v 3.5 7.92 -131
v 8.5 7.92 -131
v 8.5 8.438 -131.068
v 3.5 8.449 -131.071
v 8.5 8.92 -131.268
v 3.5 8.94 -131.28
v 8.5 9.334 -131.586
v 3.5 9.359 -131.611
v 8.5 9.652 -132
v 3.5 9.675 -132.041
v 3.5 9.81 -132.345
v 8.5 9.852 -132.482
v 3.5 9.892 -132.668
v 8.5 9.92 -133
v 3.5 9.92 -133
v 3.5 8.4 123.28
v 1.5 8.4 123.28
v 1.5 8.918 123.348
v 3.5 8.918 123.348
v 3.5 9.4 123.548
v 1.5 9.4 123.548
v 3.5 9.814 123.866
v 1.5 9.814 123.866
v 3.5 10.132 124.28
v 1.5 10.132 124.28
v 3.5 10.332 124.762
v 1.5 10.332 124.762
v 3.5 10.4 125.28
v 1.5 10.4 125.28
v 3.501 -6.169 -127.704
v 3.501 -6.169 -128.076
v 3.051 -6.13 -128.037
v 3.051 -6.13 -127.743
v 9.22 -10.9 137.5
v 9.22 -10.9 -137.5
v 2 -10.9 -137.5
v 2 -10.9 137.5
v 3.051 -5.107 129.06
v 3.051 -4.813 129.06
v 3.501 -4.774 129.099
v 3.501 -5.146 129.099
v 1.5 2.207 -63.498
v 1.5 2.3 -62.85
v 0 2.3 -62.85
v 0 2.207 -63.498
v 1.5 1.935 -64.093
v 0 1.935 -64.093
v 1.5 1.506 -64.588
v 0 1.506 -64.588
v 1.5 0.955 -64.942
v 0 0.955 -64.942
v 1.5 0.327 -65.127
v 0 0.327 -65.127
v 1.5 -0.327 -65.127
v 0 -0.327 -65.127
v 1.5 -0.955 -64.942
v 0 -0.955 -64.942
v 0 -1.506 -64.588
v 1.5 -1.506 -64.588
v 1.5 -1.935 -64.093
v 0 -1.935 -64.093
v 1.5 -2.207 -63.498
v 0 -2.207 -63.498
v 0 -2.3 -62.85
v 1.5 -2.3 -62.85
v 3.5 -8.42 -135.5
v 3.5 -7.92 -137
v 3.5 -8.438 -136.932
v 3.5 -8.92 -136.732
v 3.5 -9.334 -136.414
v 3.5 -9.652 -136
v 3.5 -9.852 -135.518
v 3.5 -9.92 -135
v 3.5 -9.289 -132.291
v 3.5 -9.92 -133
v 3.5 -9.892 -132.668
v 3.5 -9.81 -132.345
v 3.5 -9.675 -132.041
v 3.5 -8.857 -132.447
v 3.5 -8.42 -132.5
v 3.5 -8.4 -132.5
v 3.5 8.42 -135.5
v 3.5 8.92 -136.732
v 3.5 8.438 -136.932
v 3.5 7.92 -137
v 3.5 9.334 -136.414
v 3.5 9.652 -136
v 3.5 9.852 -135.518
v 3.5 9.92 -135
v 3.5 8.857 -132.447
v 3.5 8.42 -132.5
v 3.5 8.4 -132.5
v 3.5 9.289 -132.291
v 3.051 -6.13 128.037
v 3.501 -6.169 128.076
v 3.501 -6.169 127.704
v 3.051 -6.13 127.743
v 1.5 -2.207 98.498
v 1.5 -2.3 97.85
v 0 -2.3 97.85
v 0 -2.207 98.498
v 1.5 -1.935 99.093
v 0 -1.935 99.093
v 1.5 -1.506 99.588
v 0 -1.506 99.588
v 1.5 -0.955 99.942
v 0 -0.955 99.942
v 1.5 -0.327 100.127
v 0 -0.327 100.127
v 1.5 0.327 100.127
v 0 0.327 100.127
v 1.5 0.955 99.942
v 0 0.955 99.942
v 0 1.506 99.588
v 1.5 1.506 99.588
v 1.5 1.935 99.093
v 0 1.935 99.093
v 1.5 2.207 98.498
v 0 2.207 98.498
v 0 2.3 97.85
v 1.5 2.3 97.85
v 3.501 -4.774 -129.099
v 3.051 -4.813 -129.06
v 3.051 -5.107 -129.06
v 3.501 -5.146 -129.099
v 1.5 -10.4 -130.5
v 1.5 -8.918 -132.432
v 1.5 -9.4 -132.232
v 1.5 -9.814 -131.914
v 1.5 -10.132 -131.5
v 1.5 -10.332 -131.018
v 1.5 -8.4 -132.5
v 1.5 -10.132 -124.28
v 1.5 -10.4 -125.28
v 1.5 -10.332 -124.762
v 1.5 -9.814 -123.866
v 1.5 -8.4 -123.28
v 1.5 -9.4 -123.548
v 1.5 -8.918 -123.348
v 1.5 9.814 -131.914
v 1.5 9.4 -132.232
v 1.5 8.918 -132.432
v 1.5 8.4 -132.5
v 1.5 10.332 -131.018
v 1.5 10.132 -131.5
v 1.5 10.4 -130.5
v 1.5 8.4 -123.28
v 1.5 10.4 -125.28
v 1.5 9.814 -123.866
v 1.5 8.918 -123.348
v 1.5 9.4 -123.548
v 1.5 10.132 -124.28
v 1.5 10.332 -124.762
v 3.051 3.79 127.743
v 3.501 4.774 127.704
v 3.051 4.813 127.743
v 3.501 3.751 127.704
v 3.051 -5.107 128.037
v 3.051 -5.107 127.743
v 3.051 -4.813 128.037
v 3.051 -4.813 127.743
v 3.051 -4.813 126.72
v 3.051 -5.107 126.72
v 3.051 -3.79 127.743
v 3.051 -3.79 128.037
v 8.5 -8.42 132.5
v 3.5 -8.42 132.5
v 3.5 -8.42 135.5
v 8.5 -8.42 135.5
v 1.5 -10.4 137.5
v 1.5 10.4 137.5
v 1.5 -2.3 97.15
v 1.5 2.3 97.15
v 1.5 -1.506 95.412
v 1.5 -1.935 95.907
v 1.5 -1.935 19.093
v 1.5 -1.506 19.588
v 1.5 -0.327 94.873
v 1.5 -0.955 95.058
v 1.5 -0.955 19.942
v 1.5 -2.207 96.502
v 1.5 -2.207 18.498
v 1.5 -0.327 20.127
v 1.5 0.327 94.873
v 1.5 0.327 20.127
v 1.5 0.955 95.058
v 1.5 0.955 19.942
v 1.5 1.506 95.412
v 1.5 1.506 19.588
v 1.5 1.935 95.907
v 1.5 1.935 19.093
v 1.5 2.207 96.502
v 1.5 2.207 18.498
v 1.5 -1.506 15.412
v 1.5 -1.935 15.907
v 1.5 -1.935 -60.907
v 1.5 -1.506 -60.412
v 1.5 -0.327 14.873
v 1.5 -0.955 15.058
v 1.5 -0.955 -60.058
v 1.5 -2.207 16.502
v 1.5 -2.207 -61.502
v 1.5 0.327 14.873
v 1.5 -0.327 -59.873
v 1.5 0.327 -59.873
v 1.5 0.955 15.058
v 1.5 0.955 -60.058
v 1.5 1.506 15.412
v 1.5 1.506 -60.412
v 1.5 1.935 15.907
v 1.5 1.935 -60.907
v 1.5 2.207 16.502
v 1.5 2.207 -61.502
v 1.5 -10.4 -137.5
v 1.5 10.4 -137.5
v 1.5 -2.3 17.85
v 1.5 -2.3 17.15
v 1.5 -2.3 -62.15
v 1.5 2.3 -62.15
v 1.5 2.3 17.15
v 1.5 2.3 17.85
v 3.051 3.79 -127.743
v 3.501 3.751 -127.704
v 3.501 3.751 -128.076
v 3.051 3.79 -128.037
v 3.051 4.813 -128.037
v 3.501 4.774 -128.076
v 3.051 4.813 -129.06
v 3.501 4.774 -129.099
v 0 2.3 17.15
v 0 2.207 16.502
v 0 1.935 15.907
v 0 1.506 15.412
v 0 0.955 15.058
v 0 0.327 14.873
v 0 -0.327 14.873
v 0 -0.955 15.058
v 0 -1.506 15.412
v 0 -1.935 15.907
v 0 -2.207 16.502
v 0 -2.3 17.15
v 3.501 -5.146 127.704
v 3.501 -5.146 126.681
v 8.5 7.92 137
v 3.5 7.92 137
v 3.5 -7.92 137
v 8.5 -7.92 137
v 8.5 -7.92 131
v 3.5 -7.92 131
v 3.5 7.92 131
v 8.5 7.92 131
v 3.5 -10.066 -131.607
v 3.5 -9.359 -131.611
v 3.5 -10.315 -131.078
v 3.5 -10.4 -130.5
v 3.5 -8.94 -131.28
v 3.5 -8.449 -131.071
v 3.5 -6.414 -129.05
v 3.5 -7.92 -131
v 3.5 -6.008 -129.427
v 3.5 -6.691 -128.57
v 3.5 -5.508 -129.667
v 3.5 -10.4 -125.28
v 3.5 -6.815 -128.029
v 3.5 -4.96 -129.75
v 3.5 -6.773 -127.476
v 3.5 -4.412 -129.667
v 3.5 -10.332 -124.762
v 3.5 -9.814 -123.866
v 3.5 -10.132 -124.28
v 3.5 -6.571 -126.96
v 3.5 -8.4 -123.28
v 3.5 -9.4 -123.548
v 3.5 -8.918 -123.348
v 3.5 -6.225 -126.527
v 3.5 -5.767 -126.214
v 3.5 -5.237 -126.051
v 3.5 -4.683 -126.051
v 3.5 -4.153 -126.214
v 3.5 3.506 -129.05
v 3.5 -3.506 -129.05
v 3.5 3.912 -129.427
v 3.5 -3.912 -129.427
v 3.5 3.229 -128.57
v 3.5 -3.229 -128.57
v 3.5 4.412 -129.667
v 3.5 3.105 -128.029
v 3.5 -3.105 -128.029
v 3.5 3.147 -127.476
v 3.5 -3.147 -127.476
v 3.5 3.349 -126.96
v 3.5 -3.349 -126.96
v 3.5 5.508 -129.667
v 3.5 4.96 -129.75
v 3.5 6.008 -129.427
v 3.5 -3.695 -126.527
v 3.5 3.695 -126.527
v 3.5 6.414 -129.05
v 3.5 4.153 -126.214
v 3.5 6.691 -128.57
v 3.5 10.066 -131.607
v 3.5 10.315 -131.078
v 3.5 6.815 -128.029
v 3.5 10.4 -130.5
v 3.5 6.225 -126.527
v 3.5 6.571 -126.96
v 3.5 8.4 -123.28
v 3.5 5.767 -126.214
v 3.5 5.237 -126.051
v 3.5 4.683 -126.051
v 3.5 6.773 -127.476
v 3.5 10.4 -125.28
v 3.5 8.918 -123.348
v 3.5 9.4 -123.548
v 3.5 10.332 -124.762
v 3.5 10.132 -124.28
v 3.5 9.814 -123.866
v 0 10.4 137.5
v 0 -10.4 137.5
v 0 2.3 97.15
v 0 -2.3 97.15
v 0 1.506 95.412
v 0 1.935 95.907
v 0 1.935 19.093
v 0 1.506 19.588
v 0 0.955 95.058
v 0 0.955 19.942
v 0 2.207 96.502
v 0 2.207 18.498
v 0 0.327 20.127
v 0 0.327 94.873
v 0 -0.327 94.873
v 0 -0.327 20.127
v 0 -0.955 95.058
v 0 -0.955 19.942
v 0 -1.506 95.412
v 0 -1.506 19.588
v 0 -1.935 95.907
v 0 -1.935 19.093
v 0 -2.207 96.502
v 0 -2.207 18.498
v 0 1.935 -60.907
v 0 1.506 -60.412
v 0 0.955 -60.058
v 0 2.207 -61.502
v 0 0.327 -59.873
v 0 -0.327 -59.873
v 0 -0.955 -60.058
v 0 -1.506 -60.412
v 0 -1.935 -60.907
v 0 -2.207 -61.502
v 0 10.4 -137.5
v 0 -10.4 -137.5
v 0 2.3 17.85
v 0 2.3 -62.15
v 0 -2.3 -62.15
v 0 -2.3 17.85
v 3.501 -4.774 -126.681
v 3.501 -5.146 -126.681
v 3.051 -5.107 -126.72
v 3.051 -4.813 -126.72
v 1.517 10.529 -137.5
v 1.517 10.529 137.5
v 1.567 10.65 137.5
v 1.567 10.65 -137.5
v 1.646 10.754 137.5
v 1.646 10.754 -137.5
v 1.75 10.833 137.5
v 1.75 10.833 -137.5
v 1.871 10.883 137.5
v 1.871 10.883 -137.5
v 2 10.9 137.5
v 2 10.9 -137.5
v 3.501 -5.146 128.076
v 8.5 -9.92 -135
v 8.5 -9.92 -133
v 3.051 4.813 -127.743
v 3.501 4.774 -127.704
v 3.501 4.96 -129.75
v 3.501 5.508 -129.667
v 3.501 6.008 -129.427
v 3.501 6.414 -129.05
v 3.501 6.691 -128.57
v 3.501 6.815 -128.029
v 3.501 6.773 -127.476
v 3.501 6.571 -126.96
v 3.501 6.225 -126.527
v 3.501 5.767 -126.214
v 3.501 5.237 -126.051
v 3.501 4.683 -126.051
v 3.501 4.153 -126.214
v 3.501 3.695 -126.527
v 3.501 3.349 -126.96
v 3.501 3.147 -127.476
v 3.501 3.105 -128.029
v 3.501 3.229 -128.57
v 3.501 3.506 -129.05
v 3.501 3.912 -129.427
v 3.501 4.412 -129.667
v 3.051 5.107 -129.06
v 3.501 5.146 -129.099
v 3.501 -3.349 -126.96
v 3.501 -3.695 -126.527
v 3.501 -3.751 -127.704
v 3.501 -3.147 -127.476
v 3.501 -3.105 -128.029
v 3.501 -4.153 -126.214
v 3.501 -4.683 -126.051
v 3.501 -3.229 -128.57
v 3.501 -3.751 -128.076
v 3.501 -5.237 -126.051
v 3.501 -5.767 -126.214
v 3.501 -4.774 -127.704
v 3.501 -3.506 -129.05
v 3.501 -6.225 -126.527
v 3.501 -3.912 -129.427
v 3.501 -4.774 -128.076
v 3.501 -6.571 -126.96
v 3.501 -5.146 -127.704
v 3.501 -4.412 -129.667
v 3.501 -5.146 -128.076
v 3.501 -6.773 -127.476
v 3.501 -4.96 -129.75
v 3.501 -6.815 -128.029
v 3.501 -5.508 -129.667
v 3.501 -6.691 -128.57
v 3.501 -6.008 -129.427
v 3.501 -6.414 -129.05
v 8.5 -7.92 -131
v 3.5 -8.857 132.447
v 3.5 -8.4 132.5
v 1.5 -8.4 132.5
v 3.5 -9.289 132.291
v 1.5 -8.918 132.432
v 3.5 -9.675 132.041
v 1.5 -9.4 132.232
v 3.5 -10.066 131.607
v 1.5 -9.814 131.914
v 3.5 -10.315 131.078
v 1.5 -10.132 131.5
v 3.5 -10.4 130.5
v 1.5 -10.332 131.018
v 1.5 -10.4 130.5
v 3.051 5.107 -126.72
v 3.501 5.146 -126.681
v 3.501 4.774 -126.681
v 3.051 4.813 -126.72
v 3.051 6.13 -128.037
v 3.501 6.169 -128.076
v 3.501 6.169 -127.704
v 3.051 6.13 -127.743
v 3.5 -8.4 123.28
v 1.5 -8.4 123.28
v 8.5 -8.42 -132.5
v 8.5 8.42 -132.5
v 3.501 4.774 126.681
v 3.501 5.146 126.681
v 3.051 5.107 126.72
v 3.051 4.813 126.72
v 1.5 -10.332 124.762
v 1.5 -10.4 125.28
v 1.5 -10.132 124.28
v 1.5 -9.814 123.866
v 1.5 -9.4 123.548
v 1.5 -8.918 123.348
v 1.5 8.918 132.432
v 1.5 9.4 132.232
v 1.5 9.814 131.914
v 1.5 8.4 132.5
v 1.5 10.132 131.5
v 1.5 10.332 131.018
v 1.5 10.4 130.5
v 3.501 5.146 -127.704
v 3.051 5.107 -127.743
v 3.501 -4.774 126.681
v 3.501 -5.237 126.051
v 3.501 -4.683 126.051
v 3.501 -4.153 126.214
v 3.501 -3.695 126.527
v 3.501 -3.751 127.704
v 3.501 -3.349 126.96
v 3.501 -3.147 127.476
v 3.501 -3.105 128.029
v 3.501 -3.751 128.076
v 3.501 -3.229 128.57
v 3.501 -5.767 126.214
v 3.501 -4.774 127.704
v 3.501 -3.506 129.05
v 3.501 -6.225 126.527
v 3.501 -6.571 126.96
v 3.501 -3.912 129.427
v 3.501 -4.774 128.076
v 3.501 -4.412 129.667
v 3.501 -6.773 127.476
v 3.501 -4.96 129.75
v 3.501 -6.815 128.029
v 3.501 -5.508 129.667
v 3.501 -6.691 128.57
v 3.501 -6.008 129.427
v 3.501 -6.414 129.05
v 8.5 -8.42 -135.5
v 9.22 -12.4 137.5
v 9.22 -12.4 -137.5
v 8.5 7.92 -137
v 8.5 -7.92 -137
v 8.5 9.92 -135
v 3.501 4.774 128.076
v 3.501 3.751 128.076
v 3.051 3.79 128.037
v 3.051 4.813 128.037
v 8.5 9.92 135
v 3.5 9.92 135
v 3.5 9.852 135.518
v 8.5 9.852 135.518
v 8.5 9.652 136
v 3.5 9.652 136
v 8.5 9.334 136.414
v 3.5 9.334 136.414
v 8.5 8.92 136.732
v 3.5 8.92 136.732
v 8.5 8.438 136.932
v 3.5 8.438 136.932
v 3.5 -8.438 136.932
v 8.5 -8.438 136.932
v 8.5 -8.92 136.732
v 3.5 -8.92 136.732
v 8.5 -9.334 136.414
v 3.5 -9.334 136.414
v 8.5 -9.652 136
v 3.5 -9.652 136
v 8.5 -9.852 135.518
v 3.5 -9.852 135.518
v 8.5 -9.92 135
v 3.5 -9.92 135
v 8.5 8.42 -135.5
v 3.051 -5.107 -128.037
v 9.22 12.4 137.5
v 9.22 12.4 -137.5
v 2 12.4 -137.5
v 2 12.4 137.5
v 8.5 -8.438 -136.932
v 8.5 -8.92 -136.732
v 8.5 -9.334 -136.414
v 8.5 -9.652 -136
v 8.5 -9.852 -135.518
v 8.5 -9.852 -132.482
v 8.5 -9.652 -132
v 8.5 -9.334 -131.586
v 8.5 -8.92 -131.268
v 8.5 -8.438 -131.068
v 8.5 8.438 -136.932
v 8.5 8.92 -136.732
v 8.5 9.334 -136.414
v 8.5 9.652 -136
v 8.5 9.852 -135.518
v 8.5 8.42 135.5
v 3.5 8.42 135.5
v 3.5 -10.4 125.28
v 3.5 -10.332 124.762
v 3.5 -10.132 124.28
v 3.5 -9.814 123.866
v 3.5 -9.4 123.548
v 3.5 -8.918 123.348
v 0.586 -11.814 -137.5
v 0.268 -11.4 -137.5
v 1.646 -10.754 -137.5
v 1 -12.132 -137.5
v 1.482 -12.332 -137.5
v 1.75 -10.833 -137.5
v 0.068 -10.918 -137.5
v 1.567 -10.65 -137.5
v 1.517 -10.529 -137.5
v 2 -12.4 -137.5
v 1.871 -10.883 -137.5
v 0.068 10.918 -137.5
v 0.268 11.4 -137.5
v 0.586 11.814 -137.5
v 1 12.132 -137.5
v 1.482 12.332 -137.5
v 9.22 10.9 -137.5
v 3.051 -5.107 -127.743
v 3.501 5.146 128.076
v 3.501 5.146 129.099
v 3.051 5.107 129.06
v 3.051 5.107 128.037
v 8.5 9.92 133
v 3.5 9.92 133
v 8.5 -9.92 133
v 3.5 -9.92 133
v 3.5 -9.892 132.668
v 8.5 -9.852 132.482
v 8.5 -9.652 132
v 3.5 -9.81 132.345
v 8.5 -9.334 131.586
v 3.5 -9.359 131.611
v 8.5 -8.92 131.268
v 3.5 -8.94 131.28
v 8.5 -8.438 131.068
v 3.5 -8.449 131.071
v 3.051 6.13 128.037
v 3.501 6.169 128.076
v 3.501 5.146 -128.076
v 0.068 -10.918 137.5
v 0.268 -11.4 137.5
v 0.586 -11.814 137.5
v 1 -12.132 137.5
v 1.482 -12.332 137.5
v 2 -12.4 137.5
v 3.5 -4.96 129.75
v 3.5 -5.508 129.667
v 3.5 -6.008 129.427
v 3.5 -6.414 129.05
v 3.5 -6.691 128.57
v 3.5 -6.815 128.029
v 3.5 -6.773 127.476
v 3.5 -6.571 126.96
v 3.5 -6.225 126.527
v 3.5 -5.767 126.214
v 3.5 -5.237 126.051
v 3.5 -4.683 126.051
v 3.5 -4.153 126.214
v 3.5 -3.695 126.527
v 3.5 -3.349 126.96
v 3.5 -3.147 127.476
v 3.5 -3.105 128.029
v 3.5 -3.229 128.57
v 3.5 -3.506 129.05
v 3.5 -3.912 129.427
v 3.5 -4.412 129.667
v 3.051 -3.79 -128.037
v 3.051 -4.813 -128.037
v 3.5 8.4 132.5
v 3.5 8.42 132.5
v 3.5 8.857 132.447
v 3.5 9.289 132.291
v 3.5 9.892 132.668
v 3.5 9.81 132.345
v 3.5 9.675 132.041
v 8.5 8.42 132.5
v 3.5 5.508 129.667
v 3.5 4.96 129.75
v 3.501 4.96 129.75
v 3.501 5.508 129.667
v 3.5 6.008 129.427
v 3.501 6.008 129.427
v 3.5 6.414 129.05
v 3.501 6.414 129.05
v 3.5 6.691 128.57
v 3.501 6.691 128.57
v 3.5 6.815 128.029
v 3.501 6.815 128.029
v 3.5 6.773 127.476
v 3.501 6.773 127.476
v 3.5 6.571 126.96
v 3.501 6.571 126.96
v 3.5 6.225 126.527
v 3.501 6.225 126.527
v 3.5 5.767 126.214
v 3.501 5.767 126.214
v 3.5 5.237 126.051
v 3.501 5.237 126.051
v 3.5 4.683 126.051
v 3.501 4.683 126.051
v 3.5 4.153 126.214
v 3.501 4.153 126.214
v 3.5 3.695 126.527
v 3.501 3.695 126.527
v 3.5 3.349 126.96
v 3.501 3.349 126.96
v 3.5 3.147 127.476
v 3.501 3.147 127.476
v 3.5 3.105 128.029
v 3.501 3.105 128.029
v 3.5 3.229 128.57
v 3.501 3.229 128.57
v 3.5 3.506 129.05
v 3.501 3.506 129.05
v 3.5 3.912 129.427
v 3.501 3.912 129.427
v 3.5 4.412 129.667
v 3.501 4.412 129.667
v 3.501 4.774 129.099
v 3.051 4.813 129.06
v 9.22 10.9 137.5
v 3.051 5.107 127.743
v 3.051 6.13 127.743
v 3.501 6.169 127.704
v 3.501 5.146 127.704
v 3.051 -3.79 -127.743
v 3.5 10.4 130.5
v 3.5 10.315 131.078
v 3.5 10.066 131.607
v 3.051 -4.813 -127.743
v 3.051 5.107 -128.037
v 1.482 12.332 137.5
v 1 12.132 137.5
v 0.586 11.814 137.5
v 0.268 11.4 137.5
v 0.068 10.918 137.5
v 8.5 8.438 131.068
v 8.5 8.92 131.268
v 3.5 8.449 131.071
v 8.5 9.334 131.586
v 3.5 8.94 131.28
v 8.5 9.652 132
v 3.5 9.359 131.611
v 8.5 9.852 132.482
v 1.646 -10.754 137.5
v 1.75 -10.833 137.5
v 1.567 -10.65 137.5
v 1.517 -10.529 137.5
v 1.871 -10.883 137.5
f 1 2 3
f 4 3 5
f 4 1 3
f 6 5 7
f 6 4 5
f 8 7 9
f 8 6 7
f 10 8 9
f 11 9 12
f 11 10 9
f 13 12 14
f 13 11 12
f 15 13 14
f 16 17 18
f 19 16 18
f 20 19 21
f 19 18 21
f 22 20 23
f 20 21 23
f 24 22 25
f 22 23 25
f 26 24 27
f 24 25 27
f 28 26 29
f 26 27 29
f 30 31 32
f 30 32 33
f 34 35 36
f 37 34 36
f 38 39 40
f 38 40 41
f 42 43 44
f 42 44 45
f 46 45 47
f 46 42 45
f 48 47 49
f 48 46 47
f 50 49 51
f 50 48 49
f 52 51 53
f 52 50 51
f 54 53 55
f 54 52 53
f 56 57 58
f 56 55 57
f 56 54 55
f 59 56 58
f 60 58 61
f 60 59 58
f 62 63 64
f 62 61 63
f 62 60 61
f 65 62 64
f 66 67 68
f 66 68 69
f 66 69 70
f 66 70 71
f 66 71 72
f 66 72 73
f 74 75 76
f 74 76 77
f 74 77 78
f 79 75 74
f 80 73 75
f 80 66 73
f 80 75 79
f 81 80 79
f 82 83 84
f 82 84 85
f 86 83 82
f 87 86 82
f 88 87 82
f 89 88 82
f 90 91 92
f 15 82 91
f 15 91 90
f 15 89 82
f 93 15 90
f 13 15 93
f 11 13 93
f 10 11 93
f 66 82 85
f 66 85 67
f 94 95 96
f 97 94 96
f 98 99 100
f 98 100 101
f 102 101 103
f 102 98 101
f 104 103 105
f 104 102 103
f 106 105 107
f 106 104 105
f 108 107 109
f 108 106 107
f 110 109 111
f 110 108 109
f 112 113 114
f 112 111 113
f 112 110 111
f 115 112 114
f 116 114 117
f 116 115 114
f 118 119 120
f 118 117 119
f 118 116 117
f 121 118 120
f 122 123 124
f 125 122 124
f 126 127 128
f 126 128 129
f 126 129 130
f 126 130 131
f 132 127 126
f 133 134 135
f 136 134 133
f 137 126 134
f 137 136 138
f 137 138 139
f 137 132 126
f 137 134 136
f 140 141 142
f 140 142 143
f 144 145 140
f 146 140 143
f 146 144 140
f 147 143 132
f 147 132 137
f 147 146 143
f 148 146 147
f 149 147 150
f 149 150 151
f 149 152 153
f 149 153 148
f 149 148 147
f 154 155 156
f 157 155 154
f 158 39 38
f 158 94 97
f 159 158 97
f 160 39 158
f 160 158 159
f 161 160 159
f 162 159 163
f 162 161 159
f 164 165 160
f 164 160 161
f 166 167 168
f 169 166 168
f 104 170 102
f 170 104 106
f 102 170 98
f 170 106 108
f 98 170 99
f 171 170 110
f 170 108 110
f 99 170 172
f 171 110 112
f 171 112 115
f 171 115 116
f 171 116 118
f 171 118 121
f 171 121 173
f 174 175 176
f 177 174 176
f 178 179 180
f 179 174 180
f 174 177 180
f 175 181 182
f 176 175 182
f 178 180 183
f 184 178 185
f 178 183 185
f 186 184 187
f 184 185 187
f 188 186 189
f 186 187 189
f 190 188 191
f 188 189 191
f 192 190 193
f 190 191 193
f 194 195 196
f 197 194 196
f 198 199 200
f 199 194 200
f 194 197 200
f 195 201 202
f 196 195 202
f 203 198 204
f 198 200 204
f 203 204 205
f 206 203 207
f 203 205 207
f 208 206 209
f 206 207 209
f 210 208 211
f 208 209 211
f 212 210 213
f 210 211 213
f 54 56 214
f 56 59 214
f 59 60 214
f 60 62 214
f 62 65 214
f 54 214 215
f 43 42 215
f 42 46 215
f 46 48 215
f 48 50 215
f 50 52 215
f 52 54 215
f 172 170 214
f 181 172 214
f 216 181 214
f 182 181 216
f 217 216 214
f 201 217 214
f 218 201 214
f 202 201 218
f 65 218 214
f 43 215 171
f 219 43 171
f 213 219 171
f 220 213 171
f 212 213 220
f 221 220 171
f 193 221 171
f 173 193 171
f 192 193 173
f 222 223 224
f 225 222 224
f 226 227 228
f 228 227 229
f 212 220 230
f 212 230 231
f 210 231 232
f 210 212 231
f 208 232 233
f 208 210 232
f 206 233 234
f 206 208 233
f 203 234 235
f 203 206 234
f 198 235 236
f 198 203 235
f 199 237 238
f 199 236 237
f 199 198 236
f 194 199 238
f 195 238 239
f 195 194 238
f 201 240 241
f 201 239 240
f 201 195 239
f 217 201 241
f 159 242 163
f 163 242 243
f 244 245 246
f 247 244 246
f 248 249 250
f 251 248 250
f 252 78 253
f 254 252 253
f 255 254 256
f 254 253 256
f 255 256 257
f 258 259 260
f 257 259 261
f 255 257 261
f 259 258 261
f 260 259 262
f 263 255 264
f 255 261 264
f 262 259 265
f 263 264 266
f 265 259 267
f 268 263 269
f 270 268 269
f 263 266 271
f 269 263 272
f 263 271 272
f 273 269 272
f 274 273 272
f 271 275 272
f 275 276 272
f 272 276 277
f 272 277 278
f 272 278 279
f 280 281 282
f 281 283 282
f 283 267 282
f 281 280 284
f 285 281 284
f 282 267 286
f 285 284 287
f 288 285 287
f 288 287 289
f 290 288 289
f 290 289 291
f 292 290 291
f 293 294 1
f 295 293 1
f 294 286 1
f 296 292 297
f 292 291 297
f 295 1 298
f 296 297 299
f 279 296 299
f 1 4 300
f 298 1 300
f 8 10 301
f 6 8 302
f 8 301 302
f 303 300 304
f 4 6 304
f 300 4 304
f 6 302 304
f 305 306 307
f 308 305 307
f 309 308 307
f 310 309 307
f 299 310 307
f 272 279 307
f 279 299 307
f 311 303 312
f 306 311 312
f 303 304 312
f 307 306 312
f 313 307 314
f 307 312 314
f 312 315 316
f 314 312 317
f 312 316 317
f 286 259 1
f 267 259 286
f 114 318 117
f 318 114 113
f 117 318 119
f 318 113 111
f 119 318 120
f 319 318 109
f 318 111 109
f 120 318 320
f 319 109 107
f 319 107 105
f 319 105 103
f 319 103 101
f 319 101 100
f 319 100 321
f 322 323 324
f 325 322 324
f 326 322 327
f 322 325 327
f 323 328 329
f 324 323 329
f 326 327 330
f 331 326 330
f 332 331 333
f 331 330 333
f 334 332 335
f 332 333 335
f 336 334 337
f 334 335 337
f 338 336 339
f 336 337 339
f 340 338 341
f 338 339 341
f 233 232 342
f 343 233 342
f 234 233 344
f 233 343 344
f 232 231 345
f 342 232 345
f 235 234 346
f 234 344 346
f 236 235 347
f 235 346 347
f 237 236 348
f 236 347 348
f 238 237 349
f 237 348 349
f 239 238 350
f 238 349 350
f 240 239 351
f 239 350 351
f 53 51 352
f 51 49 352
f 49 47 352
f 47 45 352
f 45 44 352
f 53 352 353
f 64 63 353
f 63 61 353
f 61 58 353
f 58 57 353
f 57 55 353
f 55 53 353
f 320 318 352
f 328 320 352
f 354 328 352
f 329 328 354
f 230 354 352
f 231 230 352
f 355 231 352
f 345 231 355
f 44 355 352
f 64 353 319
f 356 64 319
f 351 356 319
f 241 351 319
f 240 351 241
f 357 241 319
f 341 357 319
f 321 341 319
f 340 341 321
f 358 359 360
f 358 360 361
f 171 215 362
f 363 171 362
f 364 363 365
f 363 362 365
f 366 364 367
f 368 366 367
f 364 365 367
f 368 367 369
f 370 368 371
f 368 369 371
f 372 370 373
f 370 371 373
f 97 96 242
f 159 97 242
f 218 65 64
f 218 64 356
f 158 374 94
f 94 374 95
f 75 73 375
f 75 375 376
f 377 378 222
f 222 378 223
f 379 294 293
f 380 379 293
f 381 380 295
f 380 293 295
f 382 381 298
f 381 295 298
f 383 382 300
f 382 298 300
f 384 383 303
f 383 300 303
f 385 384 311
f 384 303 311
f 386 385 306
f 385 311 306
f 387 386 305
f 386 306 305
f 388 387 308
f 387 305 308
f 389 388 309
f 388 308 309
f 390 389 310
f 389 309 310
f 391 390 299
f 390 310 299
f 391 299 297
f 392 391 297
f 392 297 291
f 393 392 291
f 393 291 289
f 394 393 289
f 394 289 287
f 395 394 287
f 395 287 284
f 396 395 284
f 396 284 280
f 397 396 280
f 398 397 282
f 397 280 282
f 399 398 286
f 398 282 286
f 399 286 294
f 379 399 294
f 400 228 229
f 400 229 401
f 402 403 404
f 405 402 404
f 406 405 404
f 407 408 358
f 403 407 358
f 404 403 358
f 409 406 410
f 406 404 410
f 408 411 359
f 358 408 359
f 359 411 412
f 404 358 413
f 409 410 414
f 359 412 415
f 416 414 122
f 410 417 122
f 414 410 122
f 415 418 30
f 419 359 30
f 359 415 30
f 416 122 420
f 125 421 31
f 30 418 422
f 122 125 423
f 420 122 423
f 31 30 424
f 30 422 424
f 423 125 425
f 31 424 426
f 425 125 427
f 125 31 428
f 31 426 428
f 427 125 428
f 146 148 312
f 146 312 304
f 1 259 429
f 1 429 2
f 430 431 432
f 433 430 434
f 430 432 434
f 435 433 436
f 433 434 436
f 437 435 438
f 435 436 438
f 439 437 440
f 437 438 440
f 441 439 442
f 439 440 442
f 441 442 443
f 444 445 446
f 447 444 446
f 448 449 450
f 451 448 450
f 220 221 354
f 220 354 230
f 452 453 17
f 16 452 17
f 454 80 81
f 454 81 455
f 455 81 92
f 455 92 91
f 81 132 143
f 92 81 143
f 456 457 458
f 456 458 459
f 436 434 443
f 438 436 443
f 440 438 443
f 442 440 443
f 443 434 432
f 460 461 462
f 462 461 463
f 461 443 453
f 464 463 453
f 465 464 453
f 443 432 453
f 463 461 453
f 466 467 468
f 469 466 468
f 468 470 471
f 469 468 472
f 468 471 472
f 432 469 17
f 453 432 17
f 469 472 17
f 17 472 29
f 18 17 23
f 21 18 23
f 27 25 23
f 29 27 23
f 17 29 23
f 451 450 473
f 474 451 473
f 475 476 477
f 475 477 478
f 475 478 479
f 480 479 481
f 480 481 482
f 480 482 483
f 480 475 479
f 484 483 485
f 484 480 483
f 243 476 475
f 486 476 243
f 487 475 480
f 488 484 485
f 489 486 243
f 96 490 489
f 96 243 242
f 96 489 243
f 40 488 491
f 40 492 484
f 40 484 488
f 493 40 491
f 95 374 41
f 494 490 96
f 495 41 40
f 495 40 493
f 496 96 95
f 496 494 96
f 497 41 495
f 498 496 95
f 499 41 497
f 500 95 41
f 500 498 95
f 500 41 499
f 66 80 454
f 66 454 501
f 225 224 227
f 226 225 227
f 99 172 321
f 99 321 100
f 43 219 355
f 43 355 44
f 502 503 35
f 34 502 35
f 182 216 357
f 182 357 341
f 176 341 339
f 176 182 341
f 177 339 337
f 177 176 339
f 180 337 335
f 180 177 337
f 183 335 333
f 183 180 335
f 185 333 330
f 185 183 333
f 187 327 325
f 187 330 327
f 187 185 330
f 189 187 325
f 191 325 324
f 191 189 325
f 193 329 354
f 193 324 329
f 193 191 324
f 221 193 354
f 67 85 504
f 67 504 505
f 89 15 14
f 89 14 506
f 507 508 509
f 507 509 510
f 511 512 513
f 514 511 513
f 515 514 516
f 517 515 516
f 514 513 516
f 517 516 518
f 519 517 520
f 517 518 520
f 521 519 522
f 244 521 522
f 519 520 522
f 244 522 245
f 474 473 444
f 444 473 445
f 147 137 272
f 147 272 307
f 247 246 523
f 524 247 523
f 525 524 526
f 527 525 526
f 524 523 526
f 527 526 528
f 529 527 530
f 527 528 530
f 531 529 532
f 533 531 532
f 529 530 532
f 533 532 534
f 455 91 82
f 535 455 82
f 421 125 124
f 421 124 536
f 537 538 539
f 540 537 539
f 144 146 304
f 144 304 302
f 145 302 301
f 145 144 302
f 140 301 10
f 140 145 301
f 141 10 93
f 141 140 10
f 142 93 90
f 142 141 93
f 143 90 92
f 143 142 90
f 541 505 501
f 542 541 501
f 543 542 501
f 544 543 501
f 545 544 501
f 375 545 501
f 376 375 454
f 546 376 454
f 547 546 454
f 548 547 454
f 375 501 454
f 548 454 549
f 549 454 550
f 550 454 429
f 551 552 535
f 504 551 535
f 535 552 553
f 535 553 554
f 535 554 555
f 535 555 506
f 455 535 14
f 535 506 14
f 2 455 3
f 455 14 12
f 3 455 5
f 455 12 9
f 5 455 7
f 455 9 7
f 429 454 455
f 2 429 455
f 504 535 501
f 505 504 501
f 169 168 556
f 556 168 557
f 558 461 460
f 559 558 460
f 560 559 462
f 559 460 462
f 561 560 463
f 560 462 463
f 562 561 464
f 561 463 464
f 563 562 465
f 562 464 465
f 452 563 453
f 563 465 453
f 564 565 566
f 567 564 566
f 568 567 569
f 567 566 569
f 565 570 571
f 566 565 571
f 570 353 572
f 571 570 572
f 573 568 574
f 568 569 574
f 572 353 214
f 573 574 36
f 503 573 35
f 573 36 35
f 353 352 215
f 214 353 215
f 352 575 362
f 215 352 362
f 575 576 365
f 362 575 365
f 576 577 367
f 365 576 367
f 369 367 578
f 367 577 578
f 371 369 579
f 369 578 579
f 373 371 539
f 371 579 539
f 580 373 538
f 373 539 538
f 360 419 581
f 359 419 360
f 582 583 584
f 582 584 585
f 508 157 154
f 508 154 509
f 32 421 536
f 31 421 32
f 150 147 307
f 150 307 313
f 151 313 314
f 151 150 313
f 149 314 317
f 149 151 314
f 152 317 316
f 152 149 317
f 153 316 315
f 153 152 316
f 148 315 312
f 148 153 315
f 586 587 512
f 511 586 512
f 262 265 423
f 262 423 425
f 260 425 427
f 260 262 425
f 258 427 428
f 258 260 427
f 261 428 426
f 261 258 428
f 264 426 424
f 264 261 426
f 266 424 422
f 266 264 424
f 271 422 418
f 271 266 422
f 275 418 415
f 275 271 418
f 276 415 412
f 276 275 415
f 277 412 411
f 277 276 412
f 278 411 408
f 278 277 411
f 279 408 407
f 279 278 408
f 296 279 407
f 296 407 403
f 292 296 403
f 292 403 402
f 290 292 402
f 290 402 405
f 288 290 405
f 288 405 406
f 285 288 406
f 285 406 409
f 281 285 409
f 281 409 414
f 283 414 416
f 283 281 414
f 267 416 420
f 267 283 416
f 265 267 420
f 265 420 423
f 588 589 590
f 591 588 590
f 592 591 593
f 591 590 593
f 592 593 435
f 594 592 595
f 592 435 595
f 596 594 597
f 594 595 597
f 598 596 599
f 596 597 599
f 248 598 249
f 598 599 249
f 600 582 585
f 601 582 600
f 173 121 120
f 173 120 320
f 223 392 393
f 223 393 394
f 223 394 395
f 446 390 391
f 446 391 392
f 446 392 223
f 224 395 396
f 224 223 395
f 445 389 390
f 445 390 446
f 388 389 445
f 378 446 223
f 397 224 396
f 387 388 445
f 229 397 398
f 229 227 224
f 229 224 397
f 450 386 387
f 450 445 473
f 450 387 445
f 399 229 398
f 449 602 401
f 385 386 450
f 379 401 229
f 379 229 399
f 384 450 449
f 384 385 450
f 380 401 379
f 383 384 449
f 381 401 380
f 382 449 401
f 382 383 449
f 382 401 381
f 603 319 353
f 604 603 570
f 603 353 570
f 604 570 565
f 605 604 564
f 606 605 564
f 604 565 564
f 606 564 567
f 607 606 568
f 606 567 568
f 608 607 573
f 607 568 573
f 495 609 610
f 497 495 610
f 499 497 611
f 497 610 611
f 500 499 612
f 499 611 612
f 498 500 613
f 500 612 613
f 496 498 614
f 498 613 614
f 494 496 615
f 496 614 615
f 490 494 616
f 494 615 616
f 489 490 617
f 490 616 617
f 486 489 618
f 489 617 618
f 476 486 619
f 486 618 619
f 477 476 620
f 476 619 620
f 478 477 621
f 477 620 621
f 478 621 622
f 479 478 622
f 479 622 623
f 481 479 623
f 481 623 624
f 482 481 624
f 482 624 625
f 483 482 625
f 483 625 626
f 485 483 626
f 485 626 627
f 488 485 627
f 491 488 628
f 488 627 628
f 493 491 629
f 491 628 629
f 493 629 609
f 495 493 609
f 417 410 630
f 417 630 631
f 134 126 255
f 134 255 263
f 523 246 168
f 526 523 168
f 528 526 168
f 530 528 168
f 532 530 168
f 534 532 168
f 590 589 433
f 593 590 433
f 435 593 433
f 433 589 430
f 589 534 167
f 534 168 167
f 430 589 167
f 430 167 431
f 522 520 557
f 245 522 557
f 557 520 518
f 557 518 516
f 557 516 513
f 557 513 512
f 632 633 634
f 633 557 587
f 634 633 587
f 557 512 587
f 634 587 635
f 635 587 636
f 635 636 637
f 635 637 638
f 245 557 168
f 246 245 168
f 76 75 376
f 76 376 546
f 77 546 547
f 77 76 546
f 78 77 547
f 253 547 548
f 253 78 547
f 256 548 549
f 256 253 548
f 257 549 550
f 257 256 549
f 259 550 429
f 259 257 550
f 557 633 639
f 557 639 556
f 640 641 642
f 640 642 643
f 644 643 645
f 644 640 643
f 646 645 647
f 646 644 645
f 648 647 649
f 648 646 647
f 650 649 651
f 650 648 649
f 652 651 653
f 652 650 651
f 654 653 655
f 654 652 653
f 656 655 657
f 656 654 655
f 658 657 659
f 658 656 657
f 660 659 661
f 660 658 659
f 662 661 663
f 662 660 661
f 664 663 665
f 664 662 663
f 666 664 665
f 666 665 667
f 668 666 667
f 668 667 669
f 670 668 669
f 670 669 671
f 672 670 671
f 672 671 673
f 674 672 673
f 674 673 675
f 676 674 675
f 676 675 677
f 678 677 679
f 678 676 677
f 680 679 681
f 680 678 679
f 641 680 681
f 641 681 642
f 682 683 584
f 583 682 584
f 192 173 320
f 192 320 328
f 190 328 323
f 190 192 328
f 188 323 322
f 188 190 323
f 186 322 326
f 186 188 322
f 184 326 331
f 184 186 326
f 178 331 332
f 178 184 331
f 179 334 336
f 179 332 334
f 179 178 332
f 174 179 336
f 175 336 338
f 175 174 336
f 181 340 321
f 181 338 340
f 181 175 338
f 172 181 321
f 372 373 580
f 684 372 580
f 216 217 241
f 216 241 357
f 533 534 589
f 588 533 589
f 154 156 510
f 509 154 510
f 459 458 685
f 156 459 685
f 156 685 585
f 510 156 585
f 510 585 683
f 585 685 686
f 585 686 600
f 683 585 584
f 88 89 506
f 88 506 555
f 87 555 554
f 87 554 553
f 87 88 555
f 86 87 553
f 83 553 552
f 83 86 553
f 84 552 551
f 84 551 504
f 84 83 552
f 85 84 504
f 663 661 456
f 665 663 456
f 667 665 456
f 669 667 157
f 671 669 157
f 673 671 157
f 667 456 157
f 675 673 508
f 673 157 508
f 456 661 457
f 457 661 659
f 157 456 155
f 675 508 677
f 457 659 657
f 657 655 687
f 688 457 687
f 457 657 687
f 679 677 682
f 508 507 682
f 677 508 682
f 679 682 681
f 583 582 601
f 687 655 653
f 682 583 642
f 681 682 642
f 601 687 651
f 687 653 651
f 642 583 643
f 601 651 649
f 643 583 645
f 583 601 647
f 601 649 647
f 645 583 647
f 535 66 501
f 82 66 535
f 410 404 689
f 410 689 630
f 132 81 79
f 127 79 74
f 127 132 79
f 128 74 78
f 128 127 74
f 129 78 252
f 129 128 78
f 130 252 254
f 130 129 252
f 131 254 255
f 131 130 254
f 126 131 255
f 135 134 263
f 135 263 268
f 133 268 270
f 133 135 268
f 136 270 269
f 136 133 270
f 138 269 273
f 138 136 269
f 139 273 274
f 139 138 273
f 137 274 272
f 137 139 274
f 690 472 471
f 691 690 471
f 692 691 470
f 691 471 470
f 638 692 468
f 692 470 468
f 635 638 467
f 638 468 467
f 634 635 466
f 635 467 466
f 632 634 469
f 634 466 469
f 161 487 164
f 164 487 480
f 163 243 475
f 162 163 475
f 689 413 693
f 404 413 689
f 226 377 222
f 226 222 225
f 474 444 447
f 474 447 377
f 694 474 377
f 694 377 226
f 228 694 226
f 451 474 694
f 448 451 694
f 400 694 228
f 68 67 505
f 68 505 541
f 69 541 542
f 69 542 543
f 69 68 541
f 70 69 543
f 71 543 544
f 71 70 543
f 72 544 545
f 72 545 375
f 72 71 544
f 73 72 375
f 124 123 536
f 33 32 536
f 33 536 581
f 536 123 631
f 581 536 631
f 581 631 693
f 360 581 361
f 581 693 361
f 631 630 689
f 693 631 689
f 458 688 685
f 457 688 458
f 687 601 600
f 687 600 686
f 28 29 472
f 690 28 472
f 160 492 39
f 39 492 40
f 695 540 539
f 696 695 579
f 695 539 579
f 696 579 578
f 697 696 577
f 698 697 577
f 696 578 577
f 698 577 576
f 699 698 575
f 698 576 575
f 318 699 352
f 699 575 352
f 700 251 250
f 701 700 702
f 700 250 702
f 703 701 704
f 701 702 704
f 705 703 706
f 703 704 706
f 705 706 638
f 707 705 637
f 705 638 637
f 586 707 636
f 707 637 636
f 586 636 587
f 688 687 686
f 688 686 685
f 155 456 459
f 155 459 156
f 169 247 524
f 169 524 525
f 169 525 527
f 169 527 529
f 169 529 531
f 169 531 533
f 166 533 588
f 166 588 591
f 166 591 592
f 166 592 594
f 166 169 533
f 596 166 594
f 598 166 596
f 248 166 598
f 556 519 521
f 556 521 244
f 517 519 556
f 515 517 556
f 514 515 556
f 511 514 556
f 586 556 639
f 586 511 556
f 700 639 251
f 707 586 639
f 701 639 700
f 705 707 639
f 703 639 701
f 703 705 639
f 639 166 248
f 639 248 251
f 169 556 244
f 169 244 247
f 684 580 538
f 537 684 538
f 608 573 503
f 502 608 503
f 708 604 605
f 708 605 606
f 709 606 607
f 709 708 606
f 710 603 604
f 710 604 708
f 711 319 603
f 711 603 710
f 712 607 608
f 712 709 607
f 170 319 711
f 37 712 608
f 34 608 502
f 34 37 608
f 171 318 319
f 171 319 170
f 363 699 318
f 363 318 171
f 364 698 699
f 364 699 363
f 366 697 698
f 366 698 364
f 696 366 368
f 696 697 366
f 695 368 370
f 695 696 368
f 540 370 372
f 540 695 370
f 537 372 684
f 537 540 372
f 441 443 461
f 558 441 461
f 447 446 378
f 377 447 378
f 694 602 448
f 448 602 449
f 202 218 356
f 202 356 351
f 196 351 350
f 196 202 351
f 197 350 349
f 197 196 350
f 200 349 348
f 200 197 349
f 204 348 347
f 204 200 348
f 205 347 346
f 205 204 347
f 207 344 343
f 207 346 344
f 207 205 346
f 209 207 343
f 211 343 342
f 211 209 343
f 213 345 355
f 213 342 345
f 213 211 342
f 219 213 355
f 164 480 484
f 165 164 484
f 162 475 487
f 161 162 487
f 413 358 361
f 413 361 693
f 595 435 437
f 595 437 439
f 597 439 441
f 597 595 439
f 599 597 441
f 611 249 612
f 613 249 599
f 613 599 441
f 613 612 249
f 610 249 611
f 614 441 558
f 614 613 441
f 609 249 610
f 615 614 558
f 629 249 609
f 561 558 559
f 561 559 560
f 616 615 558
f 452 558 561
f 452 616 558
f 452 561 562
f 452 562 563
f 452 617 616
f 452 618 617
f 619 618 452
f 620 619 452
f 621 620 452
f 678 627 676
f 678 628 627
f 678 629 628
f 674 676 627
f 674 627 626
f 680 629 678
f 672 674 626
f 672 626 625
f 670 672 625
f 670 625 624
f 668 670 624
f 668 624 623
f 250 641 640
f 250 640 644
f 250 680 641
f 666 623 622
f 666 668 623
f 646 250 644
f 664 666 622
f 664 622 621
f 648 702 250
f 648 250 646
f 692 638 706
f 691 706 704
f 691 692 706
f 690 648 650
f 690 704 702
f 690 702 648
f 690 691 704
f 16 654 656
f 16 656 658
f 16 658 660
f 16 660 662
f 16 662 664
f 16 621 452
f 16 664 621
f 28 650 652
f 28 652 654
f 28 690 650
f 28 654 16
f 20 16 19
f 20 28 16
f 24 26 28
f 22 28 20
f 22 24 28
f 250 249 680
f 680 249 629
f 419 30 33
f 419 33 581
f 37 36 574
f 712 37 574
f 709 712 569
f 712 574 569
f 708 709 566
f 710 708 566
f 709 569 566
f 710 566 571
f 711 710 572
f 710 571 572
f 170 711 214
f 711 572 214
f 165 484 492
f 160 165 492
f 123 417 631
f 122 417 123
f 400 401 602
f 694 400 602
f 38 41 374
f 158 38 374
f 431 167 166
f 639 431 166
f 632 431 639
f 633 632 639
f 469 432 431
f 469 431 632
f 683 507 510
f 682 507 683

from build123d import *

# Parameters (mm, degrees)
EXTRUDE_THIN1_START  = -137.5
EXTRUDE_THIN1_DEPTH  = 275
BOSS_EXTRUDE1_DEPTH  = 2
SKETCH3_R            = 1.86
BOSS_EXTRUDE2_DEPTH  = 0.001
CUT_EXTRUDE1_DEPTH   = 0.45
CUT_EXTRUDE1_DRAFT   = -5
MIRROR1_COPY_1_DEPTH = 0.45
MIRROR1_COPY_1_DRAFT = -5
SKETCH7_W            = 3
SKETCH7_H            = 16.84
BOSS_EXTRUDE3_DEPTH  = 5
CUT_EXTRUDE2_DEPTH   = 139.273672114
LPATTERN1_COUNT      = 3
LPATTERN1_PITCH      = 80


# Read off the part's stored shape, not the designer's step: Extrude-Thin1
with BuildPart() as part:
    # Extrude-Thin1 outline → Extrude-Thin1 (new body)
    with BuildSketch(Plane.XY.offset(EXTRUDE_THIN1_START)):
        with BuildLine():
            Line((2, -12.4), (9.22, -12.4))
            Line((9.22, -12.4), (9.22, -10.9))
            Line((9.22, -10.9), (2, -10.9))
            ThreePointArc((2, -10.9), (1.646446609, -10.753553391), (1.5, -10.4))
            Line((1.5, -10.4), (1.5, 10.4))
            ThreePointArc((1.5, 10.4), (1.646446609, 10.753553391), (2, 10.9))
            Line((2, 10.9), (9.22, 10.9))
            Line((9.22, 10.9), (9.22, 12.4))
            Line((9.22, 12.4), (2, 12.4))
            ThreePointArc((2, 12.4), (0.585786438, 11.814213562), (0, 10.4))
            Line((0, 10.4), (0, -10.4))
            ThreePointArc((0, -10.4), (0.585786438, -11.814213562), (2, -12.4))
        make_face()
    extrude(amount=EXTRUDE_THIN1_DEPTH)

    # Sketch8 → Cut-Extrude2 (cut, through all)
    with BuildSketch(Plane(origin=(1.5, 0, 0), x_dir=(0, 0, -1), z_dir=(1, 0, 0))):
        with BuildLine():
            Line((-97.85, 2.3), (-97.15, 2.3))
            ThreePointArc((-97.15, 2.3), (-94.85, 0), (-97.15, -2.3))
            Line((-97.15, -2.3), (-97.85, -2.3))
            ThreePointArc((-97.85, -2.3), (-100.15, 0), (-97.85, 2.3))
        make_face()
    cut_extrude2 = extrude(amount=-CUT_EXTRUDE2_DEPTH, mode=Mode.SUBTRACT)

    # LPattern1: Cut-Extrude2 ×3
    with Locations(*[(0, 0, -i * LPATTERN1_PITCH) for i in range(1, LPATTERN1_COUNT)]):
        add(cut_extrude2, mode=Mode.SUBTRACT)


with BuildPart() as body_2:
    # Sketch2 → Boss-Extrude1 (new body)
    with BuildSketch(Plane(origin=(1.5, 0, 0), x_dir=(0, 0, -1), z_dir=(1, 0, 0))):
        with BuildLine():
            Line((125.28, 10.4), (130.5, 10.4))
            ThreePointArc((130.5, 10.4), (131.914213562, 9.814213562), (132.5, 8.4))
            Line((132.5, 8.4), (132.5, -8.4))
            ThreePointArc((132.5, -8.4), (131.914213562, -9.814213562), (130.5, -10.4))
            Line((130.5, -10.4), (125.28, -10.4))
            ThreePointArc((125.28, -10.4), (123.865786438, -9.814213562), (123.28, -8.4))
            Line((123.28, -8.4), (123.28, 8.4))
            ThreePointArc((123.28, 8.4), (123.865786438, 9.814213562), (125.28, 10.4))
        make_face()
    extrude(amount=BOSS_EXTRUDE1_DEPTH)

    # Sketch3 → Boss-Extrude2 (add)
    with BuildSketch(Plane(origin=(3.5, 0, 0), x_dir=(0, 0, -1), z_dir=(1, 0, 0))):
        with Locations((127.89, 4.96)):
            Circle(SKETCH3_R)
    boss_extrude2 = extrude(amount=BOSS_EXTRUDE2_DEPTH)


with BuildPart() as cut_extrude1_tool:
    # Sketch5 → Cut-Extrude1 (with draft: the straight prism first)
    with BuildSketch(Plane(origin=(3.501, 0, 0), x_dir=(0, 0, -1), z_dir=(1, 0, 0))):
        Polygon((127.704, 4.774), (127.704, 3.751), (128.076, 3.751), (128.076, 4.774), (129.099, 4.774), (129.099, 5.146), (128.076, 5.146), (128.076, 6.169), (127.704, 6.169), (127.704, 5.146), (126.681, 5.146), (126.681, 4.774), align=None)
    extrude(amount=-CUT_EXTRUDE1_DEPTH)
    # Cut-Extrude1: the draft: its side faces are tilted about the plane it starts from
    cut_extrude1_sides = [cut_extrude1_tool.faces().sort_by_distance(p)[0] for p in [
        (3.276, 4.2625, -127.704),
        (3.276, 3.751, -127.89),
        (3.276, 4.2625, -128.076),
        (3.276, 4.774, -128.5875),
        (3.276, 4.96, -129.099),
        (3.276, 5.146, -128.5875),
        (3.276, 5.6575, -128.076),
        (3.276, 6.169, -127.89),
        (3.276, 5.6575, -127.704),
        (3.276, 5.146, -127.1925),
        (3.276, 4.96, -126.681),
        (3.276, 4.774, -127.1925),
    ]]
    draft(cut_extrude1_sides, Plane(origin=(3.501, 0, 0), x_dir=(0, 0, -1), z_dir=(1, 0, 0)), CUT_EXTRUDE1_DRAFT)


with BuildPart() as body_2_1:
    add(body_2.part)

    # Cut-Extrude1: cut by cut_extrude1_tool
    add(cut_extrude1_tool.part, mode=Mode.SUBTRACT)

    # Mirror1: Boss-Extrude2 across plane
    add(boss_extrude2.mirror(Plane.ZX))


with BuildPart() as mirror1_copy_1_tool:
    # Mirror1 copy 1 sketch → Mirror1 copy 1 (with draft: the straight prism first)
    with BuildSketch(Plane(origin=(3.501, 0, 0), x_dir=(0, 0, -1), z_dir=(1, 0, 0))):
        Polygon((127.704, -4.774), (127.704, -3.751), (128.076, -3.751), (128.076, -4.774), (129.099, -4.774), (129.099, -5.146), (128.076, -5.146), (128.076, -6.169), (127.704, -6.169), (127.704, -5.146), (126.681, -5.146), (126.681, -4.774), align=None)
    extrude(amount=-MIRROR1_COPY_1_DEPTH)
    # Mirror1 copy 1: the draft: its side faces are tilted about the plane it starts from
    mirror1_copy_1_sides = [mirror1_copy_1_tool.faces().sort_by_distance(p)[0] for p in [
        (3.276, -4.2625, -127.704),
        (3.276, -3.751, -127.89),
        (3.276, -4.2625, -128.076),
        (3.276, -4.774, -128.5875),
        (3.276, -4.96, -129.099),
        (3.276, -5.146, -128.5875),
        (3.276, -5.6575, -128.076),
        (3.276, -6.169, -127.89),
        (3.276, -5.6575, -127.704),
        (3.276, -5.146, -127.1925),
        (3.276, -4.96, -126.681),
        (3.276, -4.774, -127.1925),
    ]]
    draft(mirror1_copy_1_sides, Plane(origin=(3.501, 0, 0), x_dir=(0, 0, -1), z_dir=(1, 0, 0)), MIRROR1_COPY_1_DRAFT)


with BuildPart() as body_2_2:
    add(body_2_1.part)

    # Mirror1 copy 1: cut by mirror1_copy_1_tool
    add(mirror1_copy_1_tool.part, mode=Mode.SUBTRACT)

    # Sketch7 → Boss-Extrude3 (add)
    with BuildSketch(Plane(origin=(3.5, 0, 0), x_dir=(0, 0, -1), z_dir=(1, 0, 0))):
        with BuildLine():
            Line((133, 9.92), (135, 9.92))
            ThreePointArc((135, 9.92), (136.414213562, 9.334213562), (137, 7.92))
            Line((137, 7.92), (137, -7.92))
            ThreePointArc((137, -7.92), (136.414213562, -9.334213562), (135, -9.92))
            Line((135, -9.92), (133, -9.92))
            ThreePointArc((133, -9.92), (131.585786438, -9.334213562), (131, -7.92))
            Line((131, -7.92), (131, 7.92))
            ThreePointArc((131, 7.92), (131.585786438, 9.334213562), (133, 9.92))
        make_face()
        with Locations((134, 0)):
            Rectangle(SKETCH7_W, SKETCH7_H, mode=Mode.SUBTRACT)
    extrude(amount=BOSS_EXTRUDE3_DEPTH)


with BuildPart() as body_3:
    # Mirror2: mirrored copy
    add(body_2_2.part.mirror(Plane.XY))


solid = Compound([part.part, body_2_2.part, body_3.part])
